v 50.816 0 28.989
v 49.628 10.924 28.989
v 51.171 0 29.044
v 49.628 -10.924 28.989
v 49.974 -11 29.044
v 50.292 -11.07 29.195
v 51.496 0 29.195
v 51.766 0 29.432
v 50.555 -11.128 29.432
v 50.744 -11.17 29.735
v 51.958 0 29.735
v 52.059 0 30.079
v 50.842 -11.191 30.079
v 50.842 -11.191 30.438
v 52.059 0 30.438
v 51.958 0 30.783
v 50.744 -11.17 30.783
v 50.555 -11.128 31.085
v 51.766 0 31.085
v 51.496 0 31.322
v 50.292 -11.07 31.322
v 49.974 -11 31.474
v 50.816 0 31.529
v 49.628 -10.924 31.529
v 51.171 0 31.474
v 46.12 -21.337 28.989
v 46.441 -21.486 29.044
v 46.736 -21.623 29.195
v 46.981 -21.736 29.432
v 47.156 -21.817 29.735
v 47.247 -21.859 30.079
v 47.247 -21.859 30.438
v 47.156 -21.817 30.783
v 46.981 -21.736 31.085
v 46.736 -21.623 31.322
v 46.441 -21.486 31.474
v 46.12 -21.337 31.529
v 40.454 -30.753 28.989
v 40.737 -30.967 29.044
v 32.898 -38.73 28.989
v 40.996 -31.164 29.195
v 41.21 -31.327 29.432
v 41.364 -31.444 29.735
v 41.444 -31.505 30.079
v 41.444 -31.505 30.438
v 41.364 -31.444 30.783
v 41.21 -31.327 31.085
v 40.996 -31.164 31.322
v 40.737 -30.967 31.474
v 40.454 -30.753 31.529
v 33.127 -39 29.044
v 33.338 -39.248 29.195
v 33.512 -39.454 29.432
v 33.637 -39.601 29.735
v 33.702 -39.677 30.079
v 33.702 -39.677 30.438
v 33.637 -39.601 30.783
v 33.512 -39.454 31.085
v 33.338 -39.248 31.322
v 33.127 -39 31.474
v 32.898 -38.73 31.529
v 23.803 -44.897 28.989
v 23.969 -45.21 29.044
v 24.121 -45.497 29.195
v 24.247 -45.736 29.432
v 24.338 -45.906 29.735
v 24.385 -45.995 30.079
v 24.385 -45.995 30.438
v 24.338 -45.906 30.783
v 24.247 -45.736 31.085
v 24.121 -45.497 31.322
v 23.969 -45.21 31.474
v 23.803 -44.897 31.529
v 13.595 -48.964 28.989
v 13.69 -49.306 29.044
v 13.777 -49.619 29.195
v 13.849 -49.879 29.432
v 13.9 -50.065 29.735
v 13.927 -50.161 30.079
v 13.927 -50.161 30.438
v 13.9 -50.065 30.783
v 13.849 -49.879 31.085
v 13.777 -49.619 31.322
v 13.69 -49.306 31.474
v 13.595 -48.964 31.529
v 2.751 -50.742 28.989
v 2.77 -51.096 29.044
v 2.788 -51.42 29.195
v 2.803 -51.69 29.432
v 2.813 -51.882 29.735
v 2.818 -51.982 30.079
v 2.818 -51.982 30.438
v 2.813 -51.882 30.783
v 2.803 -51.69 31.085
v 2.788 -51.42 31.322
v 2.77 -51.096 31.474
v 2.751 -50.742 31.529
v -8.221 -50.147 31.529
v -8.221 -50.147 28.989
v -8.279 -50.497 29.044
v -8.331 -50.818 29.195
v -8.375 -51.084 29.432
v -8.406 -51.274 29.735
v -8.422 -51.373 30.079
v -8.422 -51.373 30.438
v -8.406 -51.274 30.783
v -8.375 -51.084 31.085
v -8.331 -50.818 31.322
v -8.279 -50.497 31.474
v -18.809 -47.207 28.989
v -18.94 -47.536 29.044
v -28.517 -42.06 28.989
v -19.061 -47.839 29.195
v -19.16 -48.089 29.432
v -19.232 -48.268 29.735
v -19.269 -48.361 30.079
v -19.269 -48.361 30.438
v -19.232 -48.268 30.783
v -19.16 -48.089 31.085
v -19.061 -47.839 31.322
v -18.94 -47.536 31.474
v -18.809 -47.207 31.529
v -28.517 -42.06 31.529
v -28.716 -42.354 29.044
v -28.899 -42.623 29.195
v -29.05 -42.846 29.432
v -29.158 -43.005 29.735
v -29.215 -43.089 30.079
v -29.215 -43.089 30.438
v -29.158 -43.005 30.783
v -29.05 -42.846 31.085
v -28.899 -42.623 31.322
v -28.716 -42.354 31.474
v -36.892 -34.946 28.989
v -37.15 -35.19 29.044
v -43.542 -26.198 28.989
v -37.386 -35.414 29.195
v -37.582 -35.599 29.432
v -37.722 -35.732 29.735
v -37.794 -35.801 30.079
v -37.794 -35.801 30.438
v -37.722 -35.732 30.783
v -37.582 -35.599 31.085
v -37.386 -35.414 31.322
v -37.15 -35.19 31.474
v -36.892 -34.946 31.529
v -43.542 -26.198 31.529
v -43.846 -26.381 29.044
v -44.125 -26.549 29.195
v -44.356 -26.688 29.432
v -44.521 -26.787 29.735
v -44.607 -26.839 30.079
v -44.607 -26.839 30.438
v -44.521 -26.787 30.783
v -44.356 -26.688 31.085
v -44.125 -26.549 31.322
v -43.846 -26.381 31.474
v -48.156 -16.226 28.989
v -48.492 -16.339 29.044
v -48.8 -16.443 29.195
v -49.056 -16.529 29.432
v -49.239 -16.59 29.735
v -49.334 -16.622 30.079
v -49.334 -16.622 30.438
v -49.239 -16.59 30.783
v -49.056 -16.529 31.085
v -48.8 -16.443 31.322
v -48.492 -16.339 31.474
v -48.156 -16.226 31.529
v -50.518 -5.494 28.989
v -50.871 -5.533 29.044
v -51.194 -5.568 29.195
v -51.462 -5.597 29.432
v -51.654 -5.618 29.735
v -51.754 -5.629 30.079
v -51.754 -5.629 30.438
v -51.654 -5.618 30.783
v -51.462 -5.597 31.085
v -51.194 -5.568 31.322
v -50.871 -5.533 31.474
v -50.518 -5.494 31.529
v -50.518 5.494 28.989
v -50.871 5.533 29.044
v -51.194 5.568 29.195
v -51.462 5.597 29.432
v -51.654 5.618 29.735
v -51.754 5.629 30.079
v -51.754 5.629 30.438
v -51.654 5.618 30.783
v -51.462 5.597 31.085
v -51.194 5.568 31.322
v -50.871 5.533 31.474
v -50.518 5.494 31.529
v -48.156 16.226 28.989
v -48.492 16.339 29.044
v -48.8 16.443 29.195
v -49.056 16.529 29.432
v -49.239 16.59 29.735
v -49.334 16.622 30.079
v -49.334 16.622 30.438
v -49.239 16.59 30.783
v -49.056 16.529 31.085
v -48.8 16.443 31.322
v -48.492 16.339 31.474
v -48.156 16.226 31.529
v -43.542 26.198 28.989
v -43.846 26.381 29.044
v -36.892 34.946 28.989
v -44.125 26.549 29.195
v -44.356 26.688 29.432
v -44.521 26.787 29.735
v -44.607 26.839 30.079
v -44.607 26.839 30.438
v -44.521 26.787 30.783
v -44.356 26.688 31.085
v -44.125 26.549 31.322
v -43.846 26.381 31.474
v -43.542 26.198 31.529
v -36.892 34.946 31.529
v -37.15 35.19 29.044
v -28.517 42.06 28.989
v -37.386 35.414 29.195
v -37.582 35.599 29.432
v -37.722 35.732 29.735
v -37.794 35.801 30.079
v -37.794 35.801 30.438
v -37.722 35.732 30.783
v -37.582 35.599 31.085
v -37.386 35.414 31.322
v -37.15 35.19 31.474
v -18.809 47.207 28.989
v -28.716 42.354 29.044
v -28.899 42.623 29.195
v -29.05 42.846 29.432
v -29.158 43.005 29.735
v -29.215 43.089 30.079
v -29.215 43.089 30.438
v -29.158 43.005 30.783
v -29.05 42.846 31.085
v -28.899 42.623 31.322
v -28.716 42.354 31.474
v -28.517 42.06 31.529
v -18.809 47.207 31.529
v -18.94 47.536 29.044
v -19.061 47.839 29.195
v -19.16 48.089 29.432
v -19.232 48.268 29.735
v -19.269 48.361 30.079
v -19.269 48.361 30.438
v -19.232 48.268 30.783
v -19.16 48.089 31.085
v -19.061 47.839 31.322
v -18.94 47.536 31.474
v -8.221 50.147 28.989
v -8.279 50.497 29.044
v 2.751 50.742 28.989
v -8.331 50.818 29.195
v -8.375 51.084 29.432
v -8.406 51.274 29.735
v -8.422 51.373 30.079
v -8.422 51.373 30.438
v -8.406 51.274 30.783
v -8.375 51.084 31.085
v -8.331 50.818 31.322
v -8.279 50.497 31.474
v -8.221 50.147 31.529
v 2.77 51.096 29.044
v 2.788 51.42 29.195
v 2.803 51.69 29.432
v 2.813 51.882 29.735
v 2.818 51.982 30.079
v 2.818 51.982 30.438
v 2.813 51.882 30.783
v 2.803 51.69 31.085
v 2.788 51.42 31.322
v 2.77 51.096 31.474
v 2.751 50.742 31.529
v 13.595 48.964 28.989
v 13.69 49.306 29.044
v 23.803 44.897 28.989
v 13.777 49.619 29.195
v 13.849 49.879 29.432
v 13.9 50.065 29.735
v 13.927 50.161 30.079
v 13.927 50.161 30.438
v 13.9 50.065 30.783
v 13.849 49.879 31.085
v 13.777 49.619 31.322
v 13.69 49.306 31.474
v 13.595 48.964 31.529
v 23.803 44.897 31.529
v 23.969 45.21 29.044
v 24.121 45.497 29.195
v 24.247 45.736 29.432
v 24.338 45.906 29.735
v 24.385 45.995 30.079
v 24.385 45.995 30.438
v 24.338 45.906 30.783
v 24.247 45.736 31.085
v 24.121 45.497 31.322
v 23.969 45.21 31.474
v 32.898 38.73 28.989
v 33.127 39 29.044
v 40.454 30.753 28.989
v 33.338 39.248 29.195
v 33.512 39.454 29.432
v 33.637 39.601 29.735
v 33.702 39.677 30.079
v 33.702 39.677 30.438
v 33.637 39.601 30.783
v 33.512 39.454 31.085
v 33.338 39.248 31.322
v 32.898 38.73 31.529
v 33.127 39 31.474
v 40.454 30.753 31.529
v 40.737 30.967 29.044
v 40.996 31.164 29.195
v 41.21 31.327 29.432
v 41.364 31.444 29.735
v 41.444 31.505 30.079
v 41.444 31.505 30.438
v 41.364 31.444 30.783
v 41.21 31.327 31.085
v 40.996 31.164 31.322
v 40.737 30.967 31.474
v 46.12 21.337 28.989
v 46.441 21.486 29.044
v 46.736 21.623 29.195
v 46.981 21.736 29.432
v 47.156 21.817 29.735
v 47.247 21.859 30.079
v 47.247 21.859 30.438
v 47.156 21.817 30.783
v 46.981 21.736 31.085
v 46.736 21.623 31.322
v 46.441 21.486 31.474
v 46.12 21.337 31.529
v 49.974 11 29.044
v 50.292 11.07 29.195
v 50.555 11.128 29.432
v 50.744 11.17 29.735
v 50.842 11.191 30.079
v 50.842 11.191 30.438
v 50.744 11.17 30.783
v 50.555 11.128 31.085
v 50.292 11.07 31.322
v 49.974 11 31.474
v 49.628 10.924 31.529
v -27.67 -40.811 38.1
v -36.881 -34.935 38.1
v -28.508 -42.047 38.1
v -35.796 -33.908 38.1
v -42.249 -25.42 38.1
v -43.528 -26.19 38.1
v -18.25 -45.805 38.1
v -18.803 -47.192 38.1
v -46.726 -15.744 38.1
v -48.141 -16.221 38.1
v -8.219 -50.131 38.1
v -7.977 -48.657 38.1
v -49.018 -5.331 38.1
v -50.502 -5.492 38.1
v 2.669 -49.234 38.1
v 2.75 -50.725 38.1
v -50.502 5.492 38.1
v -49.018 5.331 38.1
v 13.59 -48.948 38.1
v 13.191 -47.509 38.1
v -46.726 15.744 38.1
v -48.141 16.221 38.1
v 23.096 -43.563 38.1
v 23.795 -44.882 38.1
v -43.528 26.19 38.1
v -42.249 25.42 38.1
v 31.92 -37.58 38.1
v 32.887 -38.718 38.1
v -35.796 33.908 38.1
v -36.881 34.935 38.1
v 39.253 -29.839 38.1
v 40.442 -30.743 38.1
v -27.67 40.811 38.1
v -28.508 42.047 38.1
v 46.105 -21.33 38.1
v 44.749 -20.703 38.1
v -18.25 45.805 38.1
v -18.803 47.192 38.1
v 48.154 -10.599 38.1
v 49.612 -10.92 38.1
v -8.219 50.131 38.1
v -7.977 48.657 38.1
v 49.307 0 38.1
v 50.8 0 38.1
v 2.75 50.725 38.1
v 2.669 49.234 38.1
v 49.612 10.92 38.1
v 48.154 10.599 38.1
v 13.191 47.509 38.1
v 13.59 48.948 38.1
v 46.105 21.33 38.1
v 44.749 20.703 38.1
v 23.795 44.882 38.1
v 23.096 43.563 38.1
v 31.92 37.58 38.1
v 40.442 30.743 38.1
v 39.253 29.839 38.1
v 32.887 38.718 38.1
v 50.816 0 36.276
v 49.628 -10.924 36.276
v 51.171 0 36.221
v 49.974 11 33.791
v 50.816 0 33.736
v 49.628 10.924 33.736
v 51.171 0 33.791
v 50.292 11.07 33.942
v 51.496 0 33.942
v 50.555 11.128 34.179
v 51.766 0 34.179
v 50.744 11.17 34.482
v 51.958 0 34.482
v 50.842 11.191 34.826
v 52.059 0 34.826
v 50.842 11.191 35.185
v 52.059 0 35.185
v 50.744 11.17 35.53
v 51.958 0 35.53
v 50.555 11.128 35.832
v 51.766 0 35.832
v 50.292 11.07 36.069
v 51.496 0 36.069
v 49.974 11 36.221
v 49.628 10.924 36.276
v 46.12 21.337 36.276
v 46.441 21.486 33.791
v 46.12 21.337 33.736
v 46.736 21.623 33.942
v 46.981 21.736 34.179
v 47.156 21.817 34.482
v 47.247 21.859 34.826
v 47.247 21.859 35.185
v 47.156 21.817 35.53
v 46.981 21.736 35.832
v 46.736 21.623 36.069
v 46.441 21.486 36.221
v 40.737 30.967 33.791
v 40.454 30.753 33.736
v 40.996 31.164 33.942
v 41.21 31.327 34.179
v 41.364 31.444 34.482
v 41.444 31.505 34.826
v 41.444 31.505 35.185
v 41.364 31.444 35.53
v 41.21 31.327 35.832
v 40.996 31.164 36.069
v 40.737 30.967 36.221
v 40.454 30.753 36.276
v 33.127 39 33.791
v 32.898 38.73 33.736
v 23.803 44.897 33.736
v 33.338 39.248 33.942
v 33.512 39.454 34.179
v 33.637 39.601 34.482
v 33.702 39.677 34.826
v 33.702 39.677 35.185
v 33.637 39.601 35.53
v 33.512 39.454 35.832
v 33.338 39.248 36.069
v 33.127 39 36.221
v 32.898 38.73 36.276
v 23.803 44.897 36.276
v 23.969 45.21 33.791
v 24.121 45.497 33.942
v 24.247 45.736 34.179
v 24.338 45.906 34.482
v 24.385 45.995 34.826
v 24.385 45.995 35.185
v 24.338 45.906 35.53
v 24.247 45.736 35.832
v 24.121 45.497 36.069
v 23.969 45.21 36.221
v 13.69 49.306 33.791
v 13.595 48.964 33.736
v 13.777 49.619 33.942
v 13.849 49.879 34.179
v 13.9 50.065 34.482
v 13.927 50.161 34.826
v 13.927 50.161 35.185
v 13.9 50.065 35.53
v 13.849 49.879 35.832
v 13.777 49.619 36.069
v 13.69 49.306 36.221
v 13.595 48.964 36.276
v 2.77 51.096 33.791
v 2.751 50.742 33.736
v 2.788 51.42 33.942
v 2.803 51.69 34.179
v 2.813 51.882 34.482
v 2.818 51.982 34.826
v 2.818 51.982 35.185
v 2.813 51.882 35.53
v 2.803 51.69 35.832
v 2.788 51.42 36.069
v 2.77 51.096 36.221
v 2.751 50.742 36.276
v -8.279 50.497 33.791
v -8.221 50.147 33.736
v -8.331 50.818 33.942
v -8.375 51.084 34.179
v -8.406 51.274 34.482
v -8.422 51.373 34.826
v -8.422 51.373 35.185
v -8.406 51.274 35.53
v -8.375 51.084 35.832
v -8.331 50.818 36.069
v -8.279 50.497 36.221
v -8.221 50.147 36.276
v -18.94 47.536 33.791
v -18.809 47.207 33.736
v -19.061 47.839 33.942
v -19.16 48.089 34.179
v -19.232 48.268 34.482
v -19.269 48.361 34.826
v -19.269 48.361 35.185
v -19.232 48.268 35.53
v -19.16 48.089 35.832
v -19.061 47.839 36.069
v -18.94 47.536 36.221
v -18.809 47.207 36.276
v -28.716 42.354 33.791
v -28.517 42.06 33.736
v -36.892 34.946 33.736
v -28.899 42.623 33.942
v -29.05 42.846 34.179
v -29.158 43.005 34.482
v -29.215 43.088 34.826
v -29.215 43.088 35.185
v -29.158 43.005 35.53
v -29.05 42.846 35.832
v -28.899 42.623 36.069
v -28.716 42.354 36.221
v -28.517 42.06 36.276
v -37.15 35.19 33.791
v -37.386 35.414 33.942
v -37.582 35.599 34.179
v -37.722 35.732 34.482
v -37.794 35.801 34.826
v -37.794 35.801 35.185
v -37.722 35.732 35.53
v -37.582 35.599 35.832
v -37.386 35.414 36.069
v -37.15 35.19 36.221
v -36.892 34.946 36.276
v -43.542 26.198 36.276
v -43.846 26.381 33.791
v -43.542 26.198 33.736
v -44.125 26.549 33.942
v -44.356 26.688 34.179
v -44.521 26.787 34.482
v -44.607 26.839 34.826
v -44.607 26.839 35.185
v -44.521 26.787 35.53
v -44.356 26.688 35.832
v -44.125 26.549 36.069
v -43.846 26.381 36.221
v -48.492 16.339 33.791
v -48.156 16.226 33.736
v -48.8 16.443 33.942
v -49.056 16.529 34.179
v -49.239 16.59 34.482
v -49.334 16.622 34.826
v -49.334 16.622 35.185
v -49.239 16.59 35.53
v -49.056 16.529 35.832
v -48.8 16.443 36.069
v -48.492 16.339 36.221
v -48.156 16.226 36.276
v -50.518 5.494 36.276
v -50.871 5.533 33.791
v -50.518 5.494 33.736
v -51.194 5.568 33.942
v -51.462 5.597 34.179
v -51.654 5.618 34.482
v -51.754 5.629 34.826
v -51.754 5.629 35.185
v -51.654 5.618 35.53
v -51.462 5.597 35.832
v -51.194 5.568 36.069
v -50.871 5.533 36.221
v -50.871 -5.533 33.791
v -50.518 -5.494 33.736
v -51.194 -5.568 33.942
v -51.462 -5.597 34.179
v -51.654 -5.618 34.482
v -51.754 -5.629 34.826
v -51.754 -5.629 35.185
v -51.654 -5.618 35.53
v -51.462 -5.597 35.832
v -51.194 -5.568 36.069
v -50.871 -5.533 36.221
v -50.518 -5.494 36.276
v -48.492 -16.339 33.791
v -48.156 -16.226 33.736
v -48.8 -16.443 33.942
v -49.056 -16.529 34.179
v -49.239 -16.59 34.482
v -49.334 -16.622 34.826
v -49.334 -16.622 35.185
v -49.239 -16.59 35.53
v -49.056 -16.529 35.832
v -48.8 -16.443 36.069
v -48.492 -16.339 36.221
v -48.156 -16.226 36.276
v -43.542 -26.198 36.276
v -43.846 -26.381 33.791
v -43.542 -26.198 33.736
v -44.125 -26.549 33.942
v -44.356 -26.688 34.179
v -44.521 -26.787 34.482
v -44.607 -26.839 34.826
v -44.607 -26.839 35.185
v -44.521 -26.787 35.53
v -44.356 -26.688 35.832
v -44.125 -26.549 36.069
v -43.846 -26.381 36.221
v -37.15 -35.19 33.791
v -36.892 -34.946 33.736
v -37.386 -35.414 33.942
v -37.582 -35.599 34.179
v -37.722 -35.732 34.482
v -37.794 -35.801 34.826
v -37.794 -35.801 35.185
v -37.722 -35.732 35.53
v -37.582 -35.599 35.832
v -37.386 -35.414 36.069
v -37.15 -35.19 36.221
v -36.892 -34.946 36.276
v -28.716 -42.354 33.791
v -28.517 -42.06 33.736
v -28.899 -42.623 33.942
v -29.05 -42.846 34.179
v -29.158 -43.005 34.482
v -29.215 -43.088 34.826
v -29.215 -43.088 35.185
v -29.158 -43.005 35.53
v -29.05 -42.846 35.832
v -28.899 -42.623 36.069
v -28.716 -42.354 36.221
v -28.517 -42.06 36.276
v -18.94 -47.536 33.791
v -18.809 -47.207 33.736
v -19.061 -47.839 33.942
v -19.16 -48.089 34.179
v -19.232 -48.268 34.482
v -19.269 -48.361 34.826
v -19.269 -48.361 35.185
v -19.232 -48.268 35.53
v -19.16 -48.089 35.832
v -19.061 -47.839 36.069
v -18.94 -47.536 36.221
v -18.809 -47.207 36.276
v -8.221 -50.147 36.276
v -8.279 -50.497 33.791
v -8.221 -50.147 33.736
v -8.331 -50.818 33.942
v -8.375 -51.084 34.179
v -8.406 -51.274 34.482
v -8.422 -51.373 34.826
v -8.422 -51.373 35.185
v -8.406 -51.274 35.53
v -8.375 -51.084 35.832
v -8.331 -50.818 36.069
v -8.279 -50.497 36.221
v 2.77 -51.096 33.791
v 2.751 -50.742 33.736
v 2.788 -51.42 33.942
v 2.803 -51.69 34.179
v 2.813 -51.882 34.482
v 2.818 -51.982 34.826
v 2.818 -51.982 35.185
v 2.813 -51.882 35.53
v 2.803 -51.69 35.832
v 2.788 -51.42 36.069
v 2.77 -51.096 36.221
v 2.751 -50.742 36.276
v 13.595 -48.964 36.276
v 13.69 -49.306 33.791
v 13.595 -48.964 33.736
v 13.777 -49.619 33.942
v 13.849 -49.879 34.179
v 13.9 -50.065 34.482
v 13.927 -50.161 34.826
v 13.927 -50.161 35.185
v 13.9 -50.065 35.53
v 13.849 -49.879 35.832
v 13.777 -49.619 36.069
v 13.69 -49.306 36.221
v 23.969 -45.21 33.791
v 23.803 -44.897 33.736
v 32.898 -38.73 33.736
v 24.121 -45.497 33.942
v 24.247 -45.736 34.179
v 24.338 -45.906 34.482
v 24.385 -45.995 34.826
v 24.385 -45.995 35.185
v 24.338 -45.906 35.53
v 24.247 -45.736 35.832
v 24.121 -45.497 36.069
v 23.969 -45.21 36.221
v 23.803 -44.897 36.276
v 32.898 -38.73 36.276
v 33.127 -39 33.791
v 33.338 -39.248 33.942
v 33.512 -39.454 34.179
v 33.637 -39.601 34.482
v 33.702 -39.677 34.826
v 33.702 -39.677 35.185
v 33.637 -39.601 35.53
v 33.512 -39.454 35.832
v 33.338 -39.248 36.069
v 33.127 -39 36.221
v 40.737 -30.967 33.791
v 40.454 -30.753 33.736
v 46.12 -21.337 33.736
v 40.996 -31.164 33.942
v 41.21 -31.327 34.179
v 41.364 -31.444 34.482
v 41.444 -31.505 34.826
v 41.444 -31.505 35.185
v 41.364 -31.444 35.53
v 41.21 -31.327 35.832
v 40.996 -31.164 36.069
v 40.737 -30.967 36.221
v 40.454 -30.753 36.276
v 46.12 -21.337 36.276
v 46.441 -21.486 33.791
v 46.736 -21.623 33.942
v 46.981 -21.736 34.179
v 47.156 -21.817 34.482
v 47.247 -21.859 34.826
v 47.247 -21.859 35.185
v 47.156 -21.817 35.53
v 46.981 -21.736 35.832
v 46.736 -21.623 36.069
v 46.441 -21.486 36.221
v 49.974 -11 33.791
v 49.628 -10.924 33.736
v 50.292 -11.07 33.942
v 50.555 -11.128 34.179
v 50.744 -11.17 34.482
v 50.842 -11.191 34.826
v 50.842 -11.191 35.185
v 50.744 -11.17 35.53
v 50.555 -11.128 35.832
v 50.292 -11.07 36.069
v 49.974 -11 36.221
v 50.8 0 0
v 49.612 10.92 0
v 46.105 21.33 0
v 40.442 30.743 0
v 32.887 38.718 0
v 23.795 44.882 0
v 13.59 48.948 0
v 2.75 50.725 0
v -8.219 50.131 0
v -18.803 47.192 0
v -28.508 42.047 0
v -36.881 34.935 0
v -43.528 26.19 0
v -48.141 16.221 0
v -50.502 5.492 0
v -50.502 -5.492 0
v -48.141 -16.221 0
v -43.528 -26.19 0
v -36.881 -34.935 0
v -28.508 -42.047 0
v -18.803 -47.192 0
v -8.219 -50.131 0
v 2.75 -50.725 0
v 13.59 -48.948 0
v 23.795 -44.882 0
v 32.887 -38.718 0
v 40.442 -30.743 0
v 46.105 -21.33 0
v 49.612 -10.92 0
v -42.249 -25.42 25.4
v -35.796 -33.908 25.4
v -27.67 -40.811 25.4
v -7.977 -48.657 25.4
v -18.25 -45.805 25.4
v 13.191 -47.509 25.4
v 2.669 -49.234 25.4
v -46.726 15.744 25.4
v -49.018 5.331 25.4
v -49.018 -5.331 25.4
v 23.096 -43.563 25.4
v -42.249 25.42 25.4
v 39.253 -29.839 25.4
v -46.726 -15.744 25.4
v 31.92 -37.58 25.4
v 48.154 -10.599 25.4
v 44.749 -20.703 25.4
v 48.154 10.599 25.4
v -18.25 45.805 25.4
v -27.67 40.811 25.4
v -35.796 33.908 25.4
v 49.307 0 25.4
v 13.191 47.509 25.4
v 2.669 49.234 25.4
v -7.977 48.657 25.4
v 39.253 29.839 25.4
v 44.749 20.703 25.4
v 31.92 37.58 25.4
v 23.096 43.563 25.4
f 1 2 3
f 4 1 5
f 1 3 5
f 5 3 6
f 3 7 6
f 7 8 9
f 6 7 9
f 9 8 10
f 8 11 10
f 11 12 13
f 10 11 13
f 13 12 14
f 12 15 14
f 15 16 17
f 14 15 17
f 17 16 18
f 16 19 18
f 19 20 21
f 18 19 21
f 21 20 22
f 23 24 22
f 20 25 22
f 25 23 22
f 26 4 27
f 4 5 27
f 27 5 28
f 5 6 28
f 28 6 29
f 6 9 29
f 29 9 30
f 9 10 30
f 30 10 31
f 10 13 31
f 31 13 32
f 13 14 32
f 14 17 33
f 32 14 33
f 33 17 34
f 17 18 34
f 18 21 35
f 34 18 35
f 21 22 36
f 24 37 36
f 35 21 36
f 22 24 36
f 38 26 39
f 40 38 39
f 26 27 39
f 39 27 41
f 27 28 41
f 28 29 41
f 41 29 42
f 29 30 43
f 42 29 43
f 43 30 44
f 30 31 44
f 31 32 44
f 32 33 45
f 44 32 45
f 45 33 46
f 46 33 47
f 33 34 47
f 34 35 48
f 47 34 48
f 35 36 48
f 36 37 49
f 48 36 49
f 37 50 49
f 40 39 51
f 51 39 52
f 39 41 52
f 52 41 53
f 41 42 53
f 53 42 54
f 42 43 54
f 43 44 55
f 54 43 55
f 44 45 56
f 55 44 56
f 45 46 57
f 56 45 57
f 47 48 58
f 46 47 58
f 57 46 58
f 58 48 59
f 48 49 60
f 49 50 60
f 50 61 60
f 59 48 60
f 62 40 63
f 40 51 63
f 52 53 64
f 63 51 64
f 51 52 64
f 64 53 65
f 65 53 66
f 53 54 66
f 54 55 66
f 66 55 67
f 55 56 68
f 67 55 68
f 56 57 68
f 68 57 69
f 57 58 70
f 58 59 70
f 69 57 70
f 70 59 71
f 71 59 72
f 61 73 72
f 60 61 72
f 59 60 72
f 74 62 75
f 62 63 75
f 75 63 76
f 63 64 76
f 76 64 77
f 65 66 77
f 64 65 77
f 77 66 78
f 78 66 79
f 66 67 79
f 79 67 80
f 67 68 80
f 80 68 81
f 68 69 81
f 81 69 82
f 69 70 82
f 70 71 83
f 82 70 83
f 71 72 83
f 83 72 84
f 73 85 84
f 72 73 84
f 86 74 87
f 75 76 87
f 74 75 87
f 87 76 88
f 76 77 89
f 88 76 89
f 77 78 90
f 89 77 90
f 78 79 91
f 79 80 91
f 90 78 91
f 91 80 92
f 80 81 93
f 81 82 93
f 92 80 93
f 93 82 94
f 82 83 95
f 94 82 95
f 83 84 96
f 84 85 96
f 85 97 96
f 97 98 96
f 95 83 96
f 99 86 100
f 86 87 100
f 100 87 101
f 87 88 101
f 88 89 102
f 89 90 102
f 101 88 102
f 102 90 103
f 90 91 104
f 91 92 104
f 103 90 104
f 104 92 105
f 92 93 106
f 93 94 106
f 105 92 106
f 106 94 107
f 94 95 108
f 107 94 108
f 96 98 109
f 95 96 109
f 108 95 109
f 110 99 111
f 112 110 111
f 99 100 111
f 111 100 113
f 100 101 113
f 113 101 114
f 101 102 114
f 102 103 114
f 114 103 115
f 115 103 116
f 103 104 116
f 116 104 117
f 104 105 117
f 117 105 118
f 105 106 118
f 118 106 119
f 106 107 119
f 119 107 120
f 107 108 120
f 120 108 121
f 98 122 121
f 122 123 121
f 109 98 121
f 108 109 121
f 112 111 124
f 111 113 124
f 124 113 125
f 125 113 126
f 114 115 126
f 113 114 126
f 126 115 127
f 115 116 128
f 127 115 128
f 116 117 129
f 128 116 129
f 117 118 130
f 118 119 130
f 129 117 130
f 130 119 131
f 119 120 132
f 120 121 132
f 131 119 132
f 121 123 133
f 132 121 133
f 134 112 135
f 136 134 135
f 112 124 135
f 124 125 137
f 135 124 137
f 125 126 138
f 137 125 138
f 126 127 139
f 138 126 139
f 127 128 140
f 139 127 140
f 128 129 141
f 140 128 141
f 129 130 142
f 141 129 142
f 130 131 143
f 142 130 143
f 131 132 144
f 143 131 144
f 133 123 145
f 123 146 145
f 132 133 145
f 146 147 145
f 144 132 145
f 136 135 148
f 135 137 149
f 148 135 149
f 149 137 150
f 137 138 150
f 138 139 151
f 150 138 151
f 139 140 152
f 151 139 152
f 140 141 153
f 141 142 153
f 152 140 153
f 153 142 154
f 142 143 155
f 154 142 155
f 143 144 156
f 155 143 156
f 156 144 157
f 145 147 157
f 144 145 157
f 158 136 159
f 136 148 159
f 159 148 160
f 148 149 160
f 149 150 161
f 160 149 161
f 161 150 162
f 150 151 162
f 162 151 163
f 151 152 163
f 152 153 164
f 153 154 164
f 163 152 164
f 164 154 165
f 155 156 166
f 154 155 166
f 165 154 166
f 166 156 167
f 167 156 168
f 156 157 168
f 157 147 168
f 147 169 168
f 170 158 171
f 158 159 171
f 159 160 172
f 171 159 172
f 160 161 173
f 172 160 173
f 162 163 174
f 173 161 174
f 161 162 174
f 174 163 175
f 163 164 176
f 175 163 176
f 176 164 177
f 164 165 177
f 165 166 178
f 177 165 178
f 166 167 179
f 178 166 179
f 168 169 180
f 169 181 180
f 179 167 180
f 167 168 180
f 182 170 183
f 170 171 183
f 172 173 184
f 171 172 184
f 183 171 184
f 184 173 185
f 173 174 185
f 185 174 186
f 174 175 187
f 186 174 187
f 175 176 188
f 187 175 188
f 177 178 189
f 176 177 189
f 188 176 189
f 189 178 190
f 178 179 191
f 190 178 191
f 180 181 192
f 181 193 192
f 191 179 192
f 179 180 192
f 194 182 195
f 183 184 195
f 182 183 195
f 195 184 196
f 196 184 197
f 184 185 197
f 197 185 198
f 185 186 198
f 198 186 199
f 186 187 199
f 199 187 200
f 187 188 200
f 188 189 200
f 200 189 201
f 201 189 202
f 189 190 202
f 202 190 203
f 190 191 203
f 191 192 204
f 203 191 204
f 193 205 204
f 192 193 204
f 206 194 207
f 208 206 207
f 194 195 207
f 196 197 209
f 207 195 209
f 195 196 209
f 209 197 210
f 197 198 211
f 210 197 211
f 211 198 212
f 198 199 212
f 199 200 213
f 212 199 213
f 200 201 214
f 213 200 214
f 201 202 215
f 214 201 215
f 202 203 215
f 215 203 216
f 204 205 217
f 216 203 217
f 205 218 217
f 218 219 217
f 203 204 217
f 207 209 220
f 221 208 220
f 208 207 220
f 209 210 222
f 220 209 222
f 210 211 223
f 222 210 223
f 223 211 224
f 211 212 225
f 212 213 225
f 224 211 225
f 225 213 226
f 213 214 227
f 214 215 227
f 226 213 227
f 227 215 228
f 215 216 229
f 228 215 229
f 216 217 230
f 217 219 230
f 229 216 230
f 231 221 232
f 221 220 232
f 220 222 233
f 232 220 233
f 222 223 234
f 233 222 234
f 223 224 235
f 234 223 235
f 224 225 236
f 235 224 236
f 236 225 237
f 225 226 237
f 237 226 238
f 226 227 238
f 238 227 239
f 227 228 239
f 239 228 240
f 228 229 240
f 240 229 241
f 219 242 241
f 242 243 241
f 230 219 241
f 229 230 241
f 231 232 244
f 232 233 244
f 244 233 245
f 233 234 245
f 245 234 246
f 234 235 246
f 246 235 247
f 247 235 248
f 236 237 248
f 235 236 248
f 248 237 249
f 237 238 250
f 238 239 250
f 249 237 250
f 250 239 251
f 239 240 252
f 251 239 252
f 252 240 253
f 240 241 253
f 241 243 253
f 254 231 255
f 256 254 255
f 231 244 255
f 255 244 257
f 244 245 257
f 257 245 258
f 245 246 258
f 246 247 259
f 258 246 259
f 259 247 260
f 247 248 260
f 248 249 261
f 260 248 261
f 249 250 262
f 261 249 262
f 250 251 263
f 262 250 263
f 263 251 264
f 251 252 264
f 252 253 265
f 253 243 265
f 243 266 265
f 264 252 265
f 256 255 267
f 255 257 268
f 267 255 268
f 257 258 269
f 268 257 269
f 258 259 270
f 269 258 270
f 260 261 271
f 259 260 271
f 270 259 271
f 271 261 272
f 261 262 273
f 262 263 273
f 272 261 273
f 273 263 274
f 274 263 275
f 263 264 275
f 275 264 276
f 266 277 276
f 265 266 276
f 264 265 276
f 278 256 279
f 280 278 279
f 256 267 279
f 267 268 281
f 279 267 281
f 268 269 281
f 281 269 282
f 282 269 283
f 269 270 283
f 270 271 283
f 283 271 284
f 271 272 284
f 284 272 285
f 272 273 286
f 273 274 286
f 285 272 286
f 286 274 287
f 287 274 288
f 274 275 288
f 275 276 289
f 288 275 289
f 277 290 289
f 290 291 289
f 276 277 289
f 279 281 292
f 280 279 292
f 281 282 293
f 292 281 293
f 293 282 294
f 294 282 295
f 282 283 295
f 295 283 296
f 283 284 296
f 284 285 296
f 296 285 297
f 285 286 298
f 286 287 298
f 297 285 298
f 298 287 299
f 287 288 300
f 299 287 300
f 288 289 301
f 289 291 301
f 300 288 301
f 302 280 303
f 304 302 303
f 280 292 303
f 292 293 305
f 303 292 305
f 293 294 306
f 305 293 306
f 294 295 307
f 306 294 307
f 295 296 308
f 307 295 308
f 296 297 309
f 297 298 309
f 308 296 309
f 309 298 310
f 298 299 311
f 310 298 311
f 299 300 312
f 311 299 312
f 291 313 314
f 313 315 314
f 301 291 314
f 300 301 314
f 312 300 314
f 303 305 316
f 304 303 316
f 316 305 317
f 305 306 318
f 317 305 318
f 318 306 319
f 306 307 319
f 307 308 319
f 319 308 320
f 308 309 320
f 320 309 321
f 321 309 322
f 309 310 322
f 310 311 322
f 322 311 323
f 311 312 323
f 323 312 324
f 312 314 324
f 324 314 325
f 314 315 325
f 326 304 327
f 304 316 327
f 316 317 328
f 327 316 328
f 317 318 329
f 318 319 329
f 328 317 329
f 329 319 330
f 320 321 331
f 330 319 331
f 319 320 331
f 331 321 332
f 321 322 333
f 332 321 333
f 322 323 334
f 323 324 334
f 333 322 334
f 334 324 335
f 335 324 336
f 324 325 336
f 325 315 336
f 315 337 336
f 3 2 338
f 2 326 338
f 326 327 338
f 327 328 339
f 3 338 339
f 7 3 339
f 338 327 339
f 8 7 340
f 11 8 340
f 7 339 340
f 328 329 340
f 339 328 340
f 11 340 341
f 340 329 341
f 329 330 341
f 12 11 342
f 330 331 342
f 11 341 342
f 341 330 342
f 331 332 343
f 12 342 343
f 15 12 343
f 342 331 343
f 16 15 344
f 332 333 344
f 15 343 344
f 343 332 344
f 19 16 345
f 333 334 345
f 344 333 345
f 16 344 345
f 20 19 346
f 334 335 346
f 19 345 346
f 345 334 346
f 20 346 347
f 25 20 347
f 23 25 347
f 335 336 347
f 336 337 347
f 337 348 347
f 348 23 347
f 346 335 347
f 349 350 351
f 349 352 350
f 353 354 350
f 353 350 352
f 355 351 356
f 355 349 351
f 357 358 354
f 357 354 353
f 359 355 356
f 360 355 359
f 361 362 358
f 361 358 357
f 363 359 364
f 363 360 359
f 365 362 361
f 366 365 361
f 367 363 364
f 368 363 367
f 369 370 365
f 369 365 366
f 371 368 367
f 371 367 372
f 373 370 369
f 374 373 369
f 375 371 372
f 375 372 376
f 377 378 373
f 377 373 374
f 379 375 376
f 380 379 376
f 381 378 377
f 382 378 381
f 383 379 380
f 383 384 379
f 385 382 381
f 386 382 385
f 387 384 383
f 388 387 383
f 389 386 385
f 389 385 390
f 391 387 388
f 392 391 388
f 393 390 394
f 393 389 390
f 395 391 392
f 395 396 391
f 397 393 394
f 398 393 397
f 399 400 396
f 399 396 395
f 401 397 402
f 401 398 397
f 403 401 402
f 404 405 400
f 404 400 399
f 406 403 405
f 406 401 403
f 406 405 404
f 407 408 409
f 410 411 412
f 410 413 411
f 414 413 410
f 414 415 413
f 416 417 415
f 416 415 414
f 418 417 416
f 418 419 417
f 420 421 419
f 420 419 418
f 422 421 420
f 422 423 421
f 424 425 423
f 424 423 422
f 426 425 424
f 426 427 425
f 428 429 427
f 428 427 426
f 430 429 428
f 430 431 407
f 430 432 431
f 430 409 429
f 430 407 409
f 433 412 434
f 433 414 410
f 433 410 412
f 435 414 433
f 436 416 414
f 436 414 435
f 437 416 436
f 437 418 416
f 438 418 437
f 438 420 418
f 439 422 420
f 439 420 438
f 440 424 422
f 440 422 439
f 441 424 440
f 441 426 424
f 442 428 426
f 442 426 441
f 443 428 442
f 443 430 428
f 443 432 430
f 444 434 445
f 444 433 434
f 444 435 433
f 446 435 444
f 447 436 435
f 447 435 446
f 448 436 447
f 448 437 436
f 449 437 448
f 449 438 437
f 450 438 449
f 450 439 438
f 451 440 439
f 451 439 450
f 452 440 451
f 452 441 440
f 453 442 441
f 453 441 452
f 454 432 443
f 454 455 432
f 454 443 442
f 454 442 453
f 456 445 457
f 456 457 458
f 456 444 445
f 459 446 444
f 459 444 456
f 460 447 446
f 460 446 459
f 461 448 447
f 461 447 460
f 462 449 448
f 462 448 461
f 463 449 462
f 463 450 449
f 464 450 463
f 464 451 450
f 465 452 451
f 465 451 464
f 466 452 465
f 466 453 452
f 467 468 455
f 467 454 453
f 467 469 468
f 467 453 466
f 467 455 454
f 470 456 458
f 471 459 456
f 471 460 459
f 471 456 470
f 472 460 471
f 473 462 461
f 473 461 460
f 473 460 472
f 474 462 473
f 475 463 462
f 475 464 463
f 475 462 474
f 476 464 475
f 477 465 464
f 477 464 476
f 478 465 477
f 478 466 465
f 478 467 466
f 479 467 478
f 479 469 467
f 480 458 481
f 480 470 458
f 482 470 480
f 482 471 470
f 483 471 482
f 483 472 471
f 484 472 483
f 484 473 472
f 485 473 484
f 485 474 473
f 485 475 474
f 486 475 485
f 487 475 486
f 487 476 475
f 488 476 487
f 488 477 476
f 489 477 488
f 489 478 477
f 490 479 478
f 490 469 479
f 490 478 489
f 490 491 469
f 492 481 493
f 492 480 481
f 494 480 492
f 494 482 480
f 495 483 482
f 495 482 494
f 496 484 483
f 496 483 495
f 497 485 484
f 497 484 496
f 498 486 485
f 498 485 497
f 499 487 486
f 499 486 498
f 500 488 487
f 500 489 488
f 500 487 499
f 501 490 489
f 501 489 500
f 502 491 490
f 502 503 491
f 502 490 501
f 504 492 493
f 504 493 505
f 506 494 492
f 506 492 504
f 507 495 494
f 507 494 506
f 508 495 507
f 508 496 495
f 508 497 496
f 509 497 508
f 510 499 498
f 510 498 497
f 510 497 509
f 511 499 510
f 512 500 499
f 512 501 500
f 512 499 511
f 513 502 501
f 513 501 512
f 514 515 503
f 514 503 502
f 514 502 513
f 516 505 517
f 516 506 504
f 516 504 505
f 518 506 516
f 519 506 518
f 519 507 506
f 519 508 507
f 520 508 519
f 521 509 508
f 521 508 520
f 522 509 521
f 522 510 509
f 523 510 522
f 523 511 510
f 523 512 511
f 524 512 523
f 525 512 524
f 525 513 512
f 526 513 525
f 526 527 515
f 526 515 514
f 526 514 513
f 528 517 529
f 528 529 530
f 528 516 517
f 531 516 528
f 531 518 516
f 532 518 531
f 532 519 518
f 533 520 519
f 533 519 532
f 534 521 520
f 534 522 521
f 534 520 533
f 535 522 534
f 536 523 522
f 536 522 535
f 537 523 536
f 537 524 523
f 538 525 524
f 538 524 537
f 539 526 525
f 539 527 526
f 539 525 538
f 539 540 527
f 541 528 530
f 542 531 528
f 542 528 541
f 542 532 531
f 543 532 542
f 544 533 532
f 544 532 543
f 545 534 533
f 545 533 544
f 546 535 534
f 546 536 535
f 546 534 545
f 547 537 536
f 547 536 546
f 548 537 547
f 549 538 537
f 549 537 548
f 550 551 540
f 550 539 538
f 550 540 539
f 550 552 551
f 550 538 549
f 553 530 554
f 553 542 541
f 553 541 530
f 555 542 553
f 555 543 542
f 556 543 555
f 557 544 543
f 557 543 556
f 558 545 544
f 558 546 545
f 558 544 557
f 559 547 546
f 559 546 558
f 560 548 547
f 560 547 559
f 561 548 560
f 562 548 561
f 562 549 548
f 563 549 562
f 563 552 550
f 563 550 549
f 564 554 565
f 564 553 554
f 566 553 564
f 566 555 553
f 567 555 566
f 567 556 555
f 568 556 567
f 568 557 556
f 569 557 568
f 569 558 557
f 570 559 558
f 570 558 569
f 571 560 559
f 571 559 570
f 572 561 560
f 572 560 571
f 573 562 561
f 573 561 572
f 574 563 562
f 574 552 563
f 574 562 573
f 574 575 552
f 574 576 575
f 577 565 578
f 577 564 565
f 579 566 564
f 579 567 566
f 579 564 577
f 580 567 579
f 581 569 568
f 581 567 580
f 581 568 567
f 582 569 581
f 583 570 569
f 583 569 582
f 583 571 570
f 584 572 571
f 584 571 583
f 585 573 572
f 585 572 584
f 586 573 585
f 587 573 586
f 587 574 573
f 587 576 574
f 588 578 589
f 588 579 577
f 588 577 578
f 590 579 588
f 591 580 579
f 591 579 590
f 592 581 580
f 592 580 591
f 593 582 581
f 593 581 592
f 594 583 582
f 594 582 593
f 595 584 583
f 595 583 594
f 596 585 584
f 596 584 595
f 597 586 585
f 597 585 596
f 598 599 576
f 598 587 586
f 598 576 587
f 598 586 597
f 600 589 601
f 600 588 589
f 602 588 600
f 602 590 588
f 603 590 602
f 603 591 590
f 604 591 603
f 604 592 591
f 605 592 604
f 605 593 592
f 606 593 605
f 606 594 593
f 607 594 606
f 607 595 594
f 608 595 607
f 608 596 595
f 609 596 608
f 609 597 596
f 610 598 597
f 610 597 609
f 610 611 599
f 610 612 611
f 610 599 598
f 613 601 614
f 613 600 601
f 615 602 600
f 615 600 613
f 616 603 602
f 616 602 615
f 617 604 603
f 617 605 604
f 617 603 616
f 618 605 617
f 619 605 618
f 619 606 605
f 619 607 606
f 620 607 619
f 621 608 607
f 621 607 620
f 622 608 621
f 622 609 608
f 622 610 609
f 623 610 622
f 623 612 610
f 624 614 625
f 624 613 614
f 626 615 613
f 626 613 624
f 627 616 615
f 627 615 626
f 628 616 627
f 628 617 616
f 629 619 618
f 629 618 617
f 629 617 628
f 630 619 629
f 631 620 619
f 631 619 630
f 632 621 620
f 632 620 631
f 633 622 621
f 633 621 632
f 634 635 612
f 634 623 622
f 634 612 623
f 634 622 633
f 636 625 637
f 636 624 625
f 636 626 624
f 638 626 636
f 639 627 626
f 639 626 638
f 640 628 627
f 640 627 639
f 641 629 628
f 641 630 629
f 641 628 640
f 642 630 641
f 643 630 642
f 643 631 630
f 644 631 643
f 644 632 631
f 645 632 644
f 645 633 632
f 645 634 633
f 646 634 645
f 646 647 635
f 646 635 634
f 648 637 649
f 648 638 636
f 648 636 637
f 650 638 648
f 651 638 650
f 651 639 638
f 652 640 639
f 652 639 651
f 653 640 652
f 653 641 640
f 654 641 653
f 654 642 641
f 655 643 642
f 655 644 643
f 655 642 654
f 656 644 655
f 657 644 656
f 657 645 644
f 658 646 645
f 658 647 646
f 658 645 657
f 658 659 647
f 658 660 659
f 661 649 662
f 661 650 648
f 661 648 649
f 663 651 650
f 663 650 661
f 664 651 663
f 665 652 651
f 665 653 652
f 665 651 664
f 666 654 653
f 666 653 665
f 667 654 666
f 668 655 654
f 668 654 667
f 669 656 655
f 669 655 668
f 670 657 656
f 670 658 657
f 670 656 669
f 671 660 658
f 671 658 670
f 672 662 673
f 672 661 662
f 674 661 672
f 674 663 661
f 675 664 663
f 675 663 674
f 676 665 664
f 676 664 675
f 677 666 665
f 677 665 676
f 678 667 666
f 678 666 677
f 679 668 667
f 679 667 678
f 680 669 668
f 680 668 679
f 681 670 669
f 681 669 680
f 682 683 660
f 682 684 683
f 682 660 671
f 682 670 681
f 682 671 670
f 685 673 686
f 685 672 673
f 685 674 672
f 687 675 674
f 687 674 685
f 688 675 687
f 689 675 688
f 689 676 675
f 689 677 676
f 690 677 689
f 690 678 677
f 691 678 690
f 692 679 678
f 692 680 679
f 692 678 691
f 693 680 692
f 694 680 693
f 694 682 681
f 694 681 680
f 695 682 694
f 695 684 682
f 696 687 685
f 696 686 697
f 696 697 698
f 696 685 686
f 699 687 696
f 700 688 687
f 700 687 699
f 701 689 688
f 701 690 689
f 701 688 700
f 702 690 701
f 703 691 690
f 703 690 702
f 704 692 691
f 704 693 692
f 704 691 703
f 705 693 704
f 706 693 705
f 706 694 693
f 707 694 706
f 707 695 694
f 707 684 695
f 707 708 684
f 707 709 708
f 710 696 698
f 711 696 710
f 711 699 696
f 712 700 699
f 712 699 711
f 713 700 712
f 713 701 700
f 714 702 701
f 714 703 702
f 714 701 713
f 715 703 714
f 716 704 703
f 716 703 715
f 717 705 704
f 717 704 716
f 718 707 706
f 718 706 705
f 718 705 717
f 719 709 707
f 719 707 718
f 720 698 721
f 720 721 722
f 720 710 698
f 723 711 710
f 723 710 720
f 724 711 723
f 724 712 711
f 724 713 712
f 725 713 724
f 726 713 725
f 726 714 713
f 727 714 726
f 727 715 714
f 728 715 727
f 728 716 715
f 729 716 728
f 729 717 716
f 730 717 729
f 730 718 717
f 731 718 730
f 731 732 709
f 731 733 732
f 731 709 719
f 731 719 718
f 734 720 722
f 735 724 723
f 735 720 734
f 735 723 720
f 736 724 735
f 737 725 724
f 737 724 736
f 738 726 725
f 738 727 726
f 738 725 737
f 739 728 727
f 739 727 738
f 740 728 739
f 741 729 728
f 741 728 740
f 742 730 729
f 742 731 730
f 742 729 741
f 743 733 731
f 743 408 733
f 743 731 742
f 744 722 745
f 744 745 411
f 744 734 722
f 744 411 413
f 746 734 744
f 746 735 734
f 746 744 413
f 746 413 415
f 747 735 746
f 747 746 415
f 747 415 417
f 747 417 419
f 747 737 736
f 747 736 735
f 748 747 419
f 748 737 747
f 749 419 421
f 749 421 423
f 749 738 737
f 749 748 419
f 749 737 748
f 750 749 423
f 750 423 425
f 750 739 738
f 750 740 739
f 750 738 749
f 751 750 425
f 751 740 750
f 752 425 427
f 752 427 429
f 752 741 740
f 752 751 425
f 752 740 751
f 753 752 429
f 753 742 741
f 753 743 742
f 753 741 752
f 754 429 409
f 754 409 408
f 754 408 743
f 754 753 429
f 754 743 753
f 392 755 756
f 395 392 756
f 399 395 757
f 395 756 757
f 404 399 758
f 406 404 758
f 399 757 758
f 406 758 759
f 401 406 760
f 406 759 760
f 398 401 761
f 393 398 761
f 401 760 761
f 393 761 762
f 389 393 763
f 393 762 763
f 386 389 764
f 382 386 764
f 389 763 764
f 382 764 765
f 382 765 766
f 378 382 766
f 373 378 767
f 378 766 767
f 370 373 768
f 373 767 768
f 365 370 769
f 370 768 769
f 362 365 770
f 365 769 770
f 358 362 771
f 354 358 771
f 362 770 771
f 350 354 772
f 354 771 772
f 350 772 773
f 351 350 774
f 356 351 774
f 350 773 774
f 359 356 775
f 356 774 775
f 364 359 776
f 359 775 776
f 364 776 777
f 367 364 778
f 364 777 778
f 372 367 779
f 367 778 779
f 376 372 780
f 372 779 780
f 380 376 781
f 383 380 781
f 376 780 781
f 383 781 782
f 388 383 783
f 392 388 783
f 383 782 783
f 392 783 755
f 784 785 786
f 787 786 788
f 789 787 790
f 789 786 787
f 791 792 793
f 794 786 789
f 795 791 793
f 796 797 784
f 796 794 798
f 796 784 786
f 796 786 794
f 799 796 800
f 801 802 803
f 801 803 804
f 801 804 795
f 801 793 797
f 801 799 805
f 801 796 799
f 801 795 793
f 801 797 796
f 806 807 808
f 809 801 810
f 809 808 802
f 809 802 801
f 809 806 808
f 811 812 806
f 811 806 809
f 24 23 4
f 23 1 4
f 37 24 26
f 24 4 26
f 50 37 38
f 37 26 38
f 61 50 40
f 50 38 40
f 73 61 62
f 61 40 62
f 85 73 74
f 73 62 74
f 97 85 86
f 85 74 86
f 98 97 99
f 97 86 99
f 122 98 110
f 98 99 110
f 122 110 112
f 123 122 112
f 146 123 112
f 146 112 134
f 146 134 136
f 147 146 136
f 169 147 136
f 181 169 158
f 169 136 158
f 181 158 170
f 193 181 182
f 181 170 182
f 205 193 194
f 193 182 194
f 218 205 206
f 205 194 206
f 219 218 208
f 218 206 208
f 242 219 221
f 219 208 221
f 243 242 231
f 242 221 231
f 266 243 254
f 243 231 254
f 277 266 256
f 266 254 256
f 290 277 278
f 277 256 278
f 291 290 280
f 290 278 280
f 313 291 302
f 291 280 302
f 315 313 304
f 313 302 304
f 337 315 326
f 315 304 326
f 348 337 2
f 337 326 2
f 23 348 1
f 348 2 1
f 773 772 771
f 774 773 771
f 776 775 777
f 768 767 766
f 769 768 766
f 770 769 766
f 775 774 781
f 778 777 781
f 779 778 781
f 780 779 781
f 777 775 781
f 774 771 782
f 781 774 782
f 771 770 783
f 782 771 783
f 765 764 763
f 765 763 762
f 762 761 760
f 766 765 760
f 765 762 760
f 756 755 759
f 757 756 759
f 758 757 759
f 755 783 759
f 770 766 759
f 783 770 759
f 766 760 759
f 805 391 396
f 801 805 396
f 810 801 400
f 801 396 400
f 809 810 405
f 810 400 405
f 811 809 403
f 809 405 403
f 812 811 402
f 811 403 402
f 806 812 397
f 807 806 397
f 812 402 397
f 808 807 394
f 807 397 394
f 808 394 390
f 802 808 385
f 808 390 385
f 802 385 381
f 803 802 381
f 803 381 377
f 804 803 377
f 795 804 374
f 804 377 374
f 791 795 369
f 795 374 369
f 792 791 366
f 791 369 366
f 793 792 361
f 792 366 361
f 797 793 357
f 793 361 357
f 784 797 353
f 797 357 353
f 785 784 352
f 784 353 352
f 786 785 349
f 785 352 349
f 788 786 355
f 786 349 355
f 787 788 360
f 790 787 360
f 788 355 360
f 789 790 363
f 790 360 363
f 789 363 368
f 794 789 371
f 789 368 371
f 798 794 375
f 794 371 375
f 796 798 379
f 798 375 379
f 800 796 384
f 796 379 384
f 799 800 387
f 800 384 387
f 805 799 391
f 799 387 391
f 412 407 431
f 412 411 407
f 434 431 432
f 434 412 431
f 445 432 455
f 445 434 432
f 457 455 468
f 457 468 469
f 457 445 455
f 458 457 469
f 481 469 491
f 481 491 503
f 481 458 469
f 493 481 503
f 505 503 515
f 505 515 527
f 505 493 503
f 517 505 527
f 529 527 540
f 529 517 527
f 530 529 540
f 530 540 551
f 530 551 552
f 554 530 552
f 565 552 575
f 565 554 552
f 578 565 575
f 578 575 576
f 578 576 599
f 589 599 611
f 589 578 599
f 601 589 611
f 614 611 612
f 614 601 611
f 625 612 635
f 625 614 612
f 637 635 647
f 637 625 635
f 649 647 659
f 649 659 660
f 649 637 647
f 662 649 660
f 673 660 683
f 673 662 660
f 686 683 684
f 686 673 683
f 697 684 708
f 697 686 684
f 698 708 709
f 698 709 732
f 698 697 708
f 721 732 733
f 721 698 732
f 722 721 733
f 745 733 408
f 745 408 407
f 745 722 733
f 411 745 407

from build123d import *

# Parameters (mm, degrees)
F0_R     = 50.8
F1_DEPTH = 38.1
F2_R     = 49.306638
F3_DEPTH = 12.7


with BuildPart() as f1:
    # F0 (on Top) → F1 (new body)
    with BuildSketch(Plane.XY):
        Circle(F0_R)
    extrude(amount=F1_DEPTH)

    # F2 (on face) → F3 (cut)
    with BuildSketch(Plane.XY.offset(38.1)):
        Circle(F2_R)
    extrude(amount=-F3_DEPTH, mode=Mode.SUBTRACT)


with BuildPart() as f5:
    # F4 (on Front) → F5 (revolve)
    with BuildSketch(Plane.XZ):
        with BuildLine():
            Line((50.816165, 36.275578), (50.816165, 33.735747))
            ThreePointArc((50.816165, 33.735747), (52.071515, 35.005663), (50.816165, 36.275578))
        make_face()
    revolve(axis=Axis((0, 0, 38.1), (0, 0, 1)))


with BuildPart() as f6:
    # F4 (on Front) → F6 (revolve)
    with BuildSketch(Plane.XZ):
        with BuildLine():
            ThreePointArc((50.816165, 28.988825), (52.071569, 30.258741), (50.816165, 31.528657))
            Line((50.816165, 31.528657), (50.816165, 28.988825))
        make_face()
    revolve(axis=Axis((0, 0, 0), (0, 0, -1)))


solid = Compound([f1.part, f5.part, f6.part])
